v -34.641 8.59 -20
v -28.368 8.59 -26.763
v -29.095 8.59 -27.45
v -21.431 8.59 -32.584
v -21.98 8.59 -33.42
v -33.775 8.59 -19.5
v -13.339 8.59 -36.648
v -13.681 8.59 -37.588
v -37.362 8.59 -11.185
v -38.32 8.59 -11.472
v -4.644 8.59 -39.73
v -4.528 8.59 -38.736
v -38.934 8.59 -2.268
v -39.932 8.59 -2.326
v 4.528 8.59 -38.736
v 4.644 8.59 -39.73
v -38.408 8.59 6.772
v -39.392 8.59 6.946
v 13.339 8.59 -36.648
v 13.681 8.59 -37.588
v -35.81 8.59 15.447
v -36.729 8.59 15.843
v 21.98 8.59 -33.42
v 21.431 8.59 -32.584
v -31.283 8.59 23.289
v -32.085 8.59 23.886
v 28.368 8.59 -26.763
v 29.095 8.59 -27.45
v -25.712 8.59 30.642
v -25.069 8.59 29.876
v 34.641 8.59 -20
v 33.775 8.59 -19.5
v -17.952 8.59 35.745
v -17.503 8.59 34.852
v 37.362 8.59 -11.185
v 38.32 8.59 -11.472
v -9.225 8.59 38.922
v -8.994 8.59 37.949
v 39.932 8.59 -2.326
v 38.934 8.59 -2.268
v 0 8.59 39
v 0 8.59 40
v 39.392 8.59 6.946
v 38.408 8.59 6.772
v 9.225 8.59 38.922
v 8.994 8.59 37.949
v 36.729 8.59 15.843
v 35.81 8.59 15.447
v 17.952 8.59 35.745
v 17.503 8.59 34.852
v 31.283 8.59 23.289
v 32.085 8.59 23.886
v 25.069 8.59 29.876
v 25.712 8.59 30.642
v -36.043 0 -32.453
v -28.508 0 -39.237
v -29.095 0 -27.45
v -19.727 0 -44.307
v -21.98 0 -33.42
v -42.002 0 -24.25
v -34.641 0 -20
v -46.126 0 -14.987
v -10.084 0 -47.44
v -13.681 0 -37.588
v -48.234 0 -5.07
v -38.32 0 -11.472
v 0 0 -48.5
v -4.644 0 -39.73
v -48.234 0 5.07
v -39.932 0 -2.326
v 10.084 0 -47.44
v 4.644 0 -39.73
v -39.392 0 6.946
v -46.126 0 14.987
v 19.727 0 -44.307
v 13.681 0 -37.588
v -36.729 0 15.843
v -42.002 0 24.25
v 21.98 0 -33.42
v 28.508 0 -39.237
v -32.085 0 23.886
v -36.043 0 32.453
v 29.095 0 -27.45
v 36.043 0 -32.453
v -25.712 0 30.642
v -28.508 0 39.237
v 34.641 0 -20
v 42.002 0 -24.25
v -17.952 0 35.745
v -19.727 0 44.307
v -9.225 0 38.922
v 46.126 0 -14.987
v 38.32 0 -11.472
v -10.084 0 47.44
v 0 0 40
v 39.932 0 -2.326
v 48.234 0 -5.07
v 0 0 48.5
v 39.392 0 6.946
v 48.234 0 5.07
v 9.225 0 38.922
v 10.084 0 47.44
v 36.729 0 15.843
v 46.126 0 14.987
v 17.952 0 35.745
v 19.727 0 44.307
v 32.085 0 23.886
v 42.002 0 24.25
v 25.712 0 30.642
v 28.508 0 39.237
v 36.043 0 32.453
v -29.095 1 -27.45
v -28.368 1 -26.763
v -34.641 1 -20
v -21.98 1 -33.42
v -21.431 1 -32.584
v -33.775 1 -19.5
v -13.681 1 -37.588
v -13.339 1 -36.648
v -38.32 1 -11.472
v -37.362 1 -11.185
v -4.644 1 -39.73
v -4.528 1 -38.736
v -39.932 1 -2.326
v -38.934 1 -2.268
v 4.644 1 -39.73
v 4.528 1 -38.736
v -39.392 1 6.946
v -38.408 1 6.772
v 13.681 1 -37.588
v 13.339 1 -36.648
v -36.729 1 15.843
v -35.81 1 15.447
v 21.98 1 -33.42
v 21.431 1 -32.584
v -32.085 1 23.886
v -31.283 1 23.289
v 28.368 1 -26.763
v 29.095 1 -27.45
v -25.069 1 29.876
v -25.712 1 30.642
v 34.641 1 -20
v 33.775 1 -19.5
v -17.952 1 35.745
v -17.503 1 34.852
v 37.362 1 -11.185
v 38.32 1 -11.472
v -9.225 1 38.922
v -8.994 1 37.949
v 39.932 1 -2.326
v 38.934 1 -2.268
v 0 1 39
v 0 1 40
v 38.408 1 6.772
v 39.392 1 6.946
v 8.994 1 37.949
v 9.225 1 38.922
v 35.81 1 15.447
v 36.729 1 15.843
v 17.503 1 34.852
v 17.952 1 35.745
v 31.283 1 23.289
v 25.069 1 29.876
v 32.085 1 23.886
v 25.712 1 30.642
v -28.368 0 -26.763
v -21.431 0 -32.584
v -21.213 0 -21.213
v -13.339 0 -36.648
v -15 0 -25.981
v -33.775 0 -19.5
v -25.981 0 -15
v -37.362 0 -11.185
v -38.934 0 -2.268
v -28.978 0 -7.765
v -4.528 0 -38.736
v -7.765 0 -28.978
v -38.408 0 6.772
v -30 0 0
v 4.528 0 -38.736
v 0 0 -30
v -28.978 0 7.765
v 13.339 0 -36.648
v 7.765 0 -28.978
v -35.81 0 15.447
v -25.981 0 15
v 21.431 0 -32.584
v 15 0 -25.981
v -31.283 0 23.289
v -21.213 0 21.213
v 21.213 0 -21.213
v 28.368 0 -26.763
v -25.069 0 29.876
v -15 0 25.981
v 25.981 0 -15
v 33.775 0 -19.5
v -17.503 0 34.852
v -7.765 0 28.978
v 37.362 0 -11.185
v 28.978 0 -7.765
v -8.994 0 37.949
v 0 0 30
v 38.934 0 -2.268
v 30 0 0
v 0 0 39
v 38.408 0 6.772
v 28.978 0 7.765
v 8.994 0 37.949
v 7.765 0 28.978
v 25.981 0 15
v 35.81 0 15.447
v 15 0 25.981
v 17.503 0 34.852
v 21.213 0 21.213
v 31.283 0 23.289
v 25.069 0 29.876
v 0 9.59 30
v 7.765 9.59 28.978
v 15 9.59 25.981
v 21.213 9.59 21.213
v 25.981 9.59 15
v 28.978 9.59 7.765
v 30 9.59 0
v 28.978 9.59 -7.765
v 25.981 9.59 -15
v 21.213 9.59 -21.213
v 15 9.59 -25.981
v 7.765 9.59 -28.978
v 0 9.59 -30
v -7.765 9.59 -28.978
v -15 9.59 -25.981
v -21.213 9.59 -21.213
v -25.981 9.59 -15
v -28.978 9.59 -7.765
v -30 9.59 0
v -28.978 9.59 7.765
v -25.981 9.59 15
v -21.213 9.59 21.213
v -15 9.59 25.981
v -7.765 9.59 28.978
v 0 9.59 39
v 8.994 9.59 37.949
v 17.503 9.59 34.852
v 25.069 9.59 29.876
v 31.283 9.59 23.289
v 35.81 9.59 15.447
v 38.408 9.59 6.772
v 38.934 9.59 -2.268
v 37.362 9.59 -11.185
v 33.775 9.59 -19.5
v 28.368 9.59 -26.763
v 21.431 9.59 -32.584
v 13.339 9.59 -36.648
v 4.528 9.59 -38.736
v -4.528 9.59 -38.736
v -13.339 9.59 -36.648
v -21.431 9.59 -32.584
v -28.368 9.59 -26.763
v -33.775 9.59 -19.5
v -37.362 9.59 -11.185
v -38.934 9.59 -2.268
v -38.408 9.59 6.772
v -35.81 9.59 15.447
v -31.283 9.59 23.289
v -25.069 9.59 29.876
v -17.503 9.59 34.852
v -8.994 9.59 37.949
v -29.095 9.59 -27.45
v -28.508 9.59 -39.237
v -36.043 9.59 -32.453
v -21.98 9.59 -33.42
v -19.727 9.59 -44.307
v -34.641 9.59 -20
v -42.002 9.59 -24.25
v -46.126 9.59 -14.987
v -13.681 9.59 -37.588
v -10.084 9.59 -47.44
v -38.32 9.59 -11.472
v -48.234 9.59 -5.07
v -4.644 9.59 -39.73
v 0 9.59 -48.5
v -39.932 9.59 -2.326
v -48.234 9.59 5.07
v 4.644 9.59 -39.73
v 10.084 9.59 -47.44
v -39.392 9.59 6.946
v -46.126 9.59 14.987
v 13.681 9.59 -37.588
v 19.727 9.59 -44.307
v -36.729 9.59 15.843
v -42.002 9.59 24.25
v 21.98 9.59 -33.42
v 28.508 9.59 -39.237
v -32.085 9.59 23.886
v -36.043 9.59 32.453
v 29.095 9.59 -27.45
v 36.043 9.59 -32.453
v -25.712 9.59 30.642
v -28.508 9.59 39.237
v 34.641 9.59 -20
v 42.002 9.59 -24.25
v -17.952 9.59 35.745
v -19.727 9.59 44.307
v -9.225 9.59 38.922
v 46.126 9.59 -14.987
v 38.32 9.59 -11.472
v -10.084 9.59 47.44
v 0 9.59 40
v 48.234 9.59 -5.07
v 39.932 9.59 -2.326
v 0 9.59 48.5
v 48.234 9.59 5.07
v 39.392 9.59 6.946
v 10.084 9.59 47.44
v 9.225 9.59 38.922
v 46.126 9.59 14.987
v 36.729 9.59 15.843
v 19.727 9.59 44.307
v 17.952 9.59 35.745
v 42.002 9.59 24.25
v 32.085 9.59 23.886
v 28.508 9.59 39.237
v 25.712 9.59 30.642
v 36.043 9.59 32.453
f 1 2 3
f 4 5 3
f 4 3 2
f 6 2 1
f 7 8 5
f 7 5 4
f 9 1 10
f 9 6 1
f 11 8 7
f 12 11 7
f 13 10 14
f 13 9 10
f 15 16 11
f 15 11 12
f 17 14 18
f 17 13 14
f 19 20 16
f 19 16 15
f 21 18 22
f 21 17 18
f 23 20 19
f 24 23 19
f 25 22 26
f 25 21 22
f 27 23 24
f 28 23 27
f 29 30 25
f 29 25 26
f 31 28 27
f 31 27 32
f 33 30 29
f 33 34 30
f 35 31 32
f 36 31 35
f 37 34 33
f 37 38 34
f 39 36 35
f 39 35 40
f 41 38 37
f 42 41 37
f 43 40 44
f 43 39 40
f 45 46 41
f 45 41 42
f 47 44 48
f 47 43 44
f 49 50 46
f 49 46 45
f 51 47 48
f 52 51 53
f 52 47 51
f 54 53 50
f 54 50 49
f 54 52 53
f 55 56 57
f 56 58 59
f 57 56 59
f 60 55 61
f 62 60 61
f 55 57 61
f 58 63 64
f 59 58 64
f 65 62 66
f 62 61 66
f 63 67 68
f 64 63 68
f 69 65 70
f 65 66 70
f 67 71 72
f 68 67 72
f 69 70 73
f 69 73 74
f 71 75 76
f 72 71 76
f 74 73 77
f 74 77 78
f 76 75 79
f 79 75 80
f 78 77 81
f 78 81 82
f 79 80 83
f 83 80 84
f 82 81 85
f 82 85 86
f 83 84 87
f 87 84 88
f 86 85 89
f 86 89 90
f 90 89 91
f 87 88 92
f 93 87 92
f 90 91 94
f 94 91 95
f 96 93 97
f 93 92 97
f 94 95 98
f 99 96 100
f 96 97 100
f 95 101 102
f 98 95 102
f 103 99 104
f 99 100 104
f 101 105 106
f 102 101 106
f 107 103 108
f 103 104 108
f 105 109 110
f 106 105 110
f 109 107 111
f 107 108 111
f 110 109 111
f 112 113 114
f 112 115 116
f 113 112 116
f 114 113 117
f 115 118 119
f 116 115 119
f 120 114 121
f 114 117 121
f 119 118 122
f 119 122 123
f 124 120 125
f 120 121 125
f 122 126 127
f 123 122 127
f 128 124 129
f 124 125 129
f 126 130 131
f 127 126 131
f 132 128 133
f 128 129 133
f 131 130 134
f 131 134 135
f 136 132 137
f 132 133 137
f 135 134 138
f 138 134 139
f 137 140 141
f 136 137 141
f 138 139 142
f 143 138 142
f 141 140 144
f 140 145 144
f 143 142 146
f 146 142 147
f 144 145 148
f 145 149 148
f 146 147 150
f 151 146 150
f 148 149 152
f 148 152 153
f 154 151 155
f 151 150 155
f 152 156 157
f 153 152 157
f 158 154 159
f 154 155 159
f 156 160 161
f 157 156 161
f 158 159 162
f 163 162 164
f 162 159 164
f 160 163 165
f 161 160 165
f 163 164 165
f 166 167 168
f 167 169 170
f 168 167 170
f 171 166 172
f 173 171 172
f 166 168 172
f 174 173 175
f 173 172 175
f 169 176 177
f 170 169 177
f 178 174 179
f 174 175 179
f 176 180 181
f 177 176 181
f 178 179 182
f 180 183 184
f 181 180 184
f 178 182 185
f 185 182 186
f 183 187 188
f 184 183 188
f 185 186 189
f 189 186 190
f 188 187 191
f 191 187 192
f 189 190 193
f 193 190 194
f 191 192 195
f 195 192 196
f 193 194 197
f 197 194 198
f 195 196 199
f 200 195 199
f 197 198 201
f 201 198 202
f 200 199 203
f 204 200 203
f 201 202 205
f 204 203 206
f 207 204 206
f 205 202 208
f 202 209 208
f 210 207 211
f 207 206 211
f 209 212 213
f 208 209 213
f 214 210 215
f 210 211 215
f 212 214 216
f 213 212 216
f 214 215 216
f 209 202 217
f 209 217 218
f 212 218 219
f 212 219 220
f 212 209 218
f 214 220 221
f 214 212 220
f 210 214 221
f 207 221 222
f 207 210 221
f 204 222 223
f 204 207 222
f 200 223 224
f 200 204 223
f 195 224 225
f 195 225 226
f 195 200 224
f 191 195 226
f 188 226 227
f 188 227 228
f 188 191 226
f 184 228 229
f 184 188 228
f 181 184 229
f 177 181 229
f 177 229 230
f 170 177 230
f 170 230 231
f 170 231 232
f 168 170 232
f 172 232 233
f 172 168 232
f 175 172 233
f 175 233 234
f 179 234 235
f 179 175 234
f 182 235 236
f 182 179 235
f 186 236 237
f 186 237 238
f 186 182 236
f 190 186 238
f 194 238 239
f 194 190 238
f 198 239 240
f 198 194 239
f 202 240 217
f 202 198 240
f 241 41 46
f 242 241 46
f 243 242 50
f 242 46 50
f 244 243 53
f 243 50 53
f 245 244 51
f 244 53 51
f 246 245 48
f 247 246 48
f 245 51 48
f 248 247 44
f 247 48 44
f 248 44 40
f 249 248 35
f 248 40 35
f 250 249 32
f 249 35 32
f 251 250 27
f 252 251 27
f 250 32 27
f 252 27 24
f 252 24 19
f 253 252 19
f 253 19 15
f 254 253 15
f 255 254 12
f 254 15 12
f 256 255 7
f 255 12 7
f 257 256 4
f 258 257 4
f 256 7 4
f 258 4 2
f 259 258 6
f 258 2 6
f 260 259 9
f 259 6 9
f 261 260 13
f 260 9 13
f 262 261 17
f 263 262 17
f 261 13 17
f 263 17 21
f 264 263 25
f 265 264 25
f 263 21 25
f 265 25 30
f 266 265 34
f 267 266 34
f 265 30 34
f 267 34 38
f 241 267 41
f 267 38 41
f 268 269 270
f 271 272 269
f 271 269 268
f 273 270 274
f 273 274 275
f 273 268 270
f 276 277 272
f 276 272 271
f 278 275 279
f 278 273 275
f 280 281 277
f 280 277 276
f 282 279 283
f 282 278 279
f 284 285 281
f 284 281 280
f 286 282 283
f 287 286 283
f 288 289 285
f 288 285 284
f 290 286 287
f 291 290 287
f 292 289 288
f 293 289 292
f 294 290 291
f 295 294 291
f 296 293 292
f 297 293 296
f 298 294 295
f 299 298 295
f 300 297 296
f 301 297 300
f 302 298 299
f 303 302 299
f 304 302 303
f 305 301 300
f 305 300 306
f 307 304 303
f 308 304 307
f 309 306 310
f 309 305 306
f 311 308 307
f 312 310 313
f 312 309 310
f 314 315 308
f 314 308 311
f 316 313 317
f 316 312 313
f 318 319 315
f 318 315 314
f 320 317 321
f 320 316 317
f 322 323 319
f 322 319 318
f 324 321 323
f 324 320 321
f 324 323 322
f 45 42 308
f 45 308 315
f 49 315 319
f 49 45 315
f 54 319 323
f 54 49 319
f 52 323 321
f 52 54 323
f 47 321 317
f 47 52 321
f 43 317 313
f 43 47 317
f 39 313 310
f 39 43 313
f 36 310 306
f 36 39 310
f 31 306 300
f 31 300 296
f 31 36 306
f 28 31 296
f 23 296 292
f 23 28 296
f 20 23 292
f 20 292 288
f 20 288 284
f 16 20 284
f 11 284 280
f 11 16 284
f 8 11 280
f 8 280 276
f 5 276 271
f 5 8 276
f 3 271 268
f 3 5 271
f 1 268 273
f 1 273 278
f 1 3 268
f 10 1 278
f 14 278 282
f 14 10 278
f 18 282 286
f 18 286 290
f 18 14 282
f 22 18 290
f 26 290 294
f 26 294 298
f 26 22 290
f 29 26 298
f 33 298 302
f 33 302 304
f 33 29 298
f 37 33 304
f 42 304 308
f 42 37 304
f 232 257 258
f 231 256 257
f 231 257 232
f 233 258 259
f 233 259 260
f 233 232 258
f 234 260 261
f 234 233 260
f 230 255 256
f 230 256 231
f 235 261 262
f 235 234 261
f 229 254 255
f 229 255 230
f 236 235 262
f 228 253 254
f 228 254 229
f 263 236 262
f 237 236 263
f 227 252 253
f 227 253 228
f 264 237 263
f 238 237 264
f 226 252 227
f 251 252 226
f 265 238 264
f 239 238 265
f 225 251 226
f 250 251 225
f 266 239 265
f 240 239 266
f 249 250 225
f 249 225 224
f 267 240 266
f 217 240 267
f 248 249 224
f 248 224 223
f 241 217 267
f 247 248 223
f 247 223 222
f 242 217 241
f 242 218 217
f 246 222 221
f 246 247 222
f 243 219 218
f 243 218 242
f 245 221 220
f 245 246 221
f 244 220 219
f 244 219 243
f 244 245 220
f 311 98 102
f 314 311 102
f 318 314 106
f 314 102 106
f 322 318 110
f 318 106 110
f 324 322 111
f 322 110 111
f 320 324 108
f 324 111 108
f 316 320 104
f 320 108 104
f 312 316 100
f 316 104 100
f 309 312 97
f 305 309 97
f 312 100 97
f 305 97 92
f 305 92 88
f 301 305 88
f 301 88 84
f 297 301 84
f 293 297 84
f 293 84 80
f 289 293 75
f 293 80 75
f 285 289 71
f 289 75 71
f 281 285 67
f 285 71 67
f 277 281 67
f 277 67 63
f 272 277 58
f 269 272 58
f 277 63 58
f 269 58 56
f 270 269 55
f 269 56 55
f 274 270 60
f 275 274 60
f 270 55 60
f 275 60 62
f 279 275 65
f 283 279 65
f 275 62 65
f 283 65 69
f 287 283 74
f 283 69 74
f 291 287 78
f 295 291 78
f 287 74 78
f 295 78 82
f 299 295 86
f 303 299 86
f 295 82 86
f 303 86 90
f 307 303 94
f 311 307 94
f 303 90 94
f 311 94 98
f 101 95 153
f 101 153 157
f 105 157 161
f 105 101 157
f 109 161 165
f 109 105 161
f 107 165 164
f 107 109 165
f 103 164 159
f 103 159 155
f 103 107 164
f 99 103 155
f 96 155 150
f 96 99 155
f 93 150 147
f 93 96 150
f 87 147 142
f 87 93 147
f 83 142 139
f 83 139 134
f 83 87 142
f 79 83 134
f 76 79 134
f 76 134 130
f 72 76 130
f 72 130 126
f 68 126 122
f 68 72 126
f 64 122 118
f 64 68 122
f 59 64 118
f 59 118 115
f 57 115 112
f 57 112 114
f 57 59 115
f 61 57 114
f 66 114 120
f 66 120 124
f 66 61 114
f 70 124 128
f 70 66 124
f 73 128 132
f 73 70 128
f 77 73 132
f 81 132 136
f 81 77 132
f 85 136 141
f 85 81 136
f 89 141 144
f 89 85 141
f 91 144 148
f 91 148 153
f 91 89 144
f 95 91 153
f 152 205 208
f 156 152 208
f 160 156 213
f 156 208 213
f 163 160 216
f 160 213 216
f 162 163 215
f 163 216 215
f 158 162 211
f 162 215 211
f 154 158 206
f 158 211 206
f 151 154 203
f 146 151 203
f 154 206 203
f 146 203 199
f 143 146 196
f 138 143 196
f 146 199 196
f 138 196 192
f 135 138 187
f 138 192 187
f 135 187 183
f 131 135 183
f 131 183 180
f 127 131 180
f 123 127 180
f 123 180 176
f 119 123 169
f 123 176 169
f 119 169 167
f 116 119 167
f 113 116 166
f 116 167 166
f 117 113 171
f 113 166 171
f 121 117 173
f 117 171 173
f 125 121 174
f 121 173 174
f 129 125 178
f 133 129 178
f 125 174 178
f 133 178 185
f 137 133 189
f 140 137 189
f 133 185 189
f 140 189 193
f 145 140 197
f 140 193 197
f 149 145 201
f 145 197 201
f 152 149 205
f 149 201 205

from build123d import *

# Parameters (mm, degrees)
SKETCH1_R           = 48.5
SKETCH1_R_2         = 30
BOSS_EXTRUDE1_DEPTH = 9.59
SKETCH2_R           = 40
SKETCH2_R_2         = 39
CUT_EXTRUDE1_DEPTH  = 1
CUT_EXTRUDE2_START  = -1
SKETCH3_R           = 40
SKETCH3_R_2         = 39
CUT_EXTRUDE2_DEPTH  = 1


with BuildPart() as part:
    # Sketch1 → Boss-Extrude1 (new body)
    with BuildSketch(Plane(origin=(0, 0, 0), x_dir=(1, 0, 0), z_dir=(0, 1, 0))):
        with Locations(Location((0, 0, 0), (0, 0, 270))):
            Circle(SKETCH1_R)
        with Locations(Location((0, 0, 0), (0, 0, 270))):
            Circle(SKETCH1_R_2, mode=Mode.SUBTRACT)
    extrude(amount=BOSS_EXTRUDE1_DEPTH)

    # Sketch2 → Cut-Extrude1 (cut)
    with BuildSketch(Plane(origin=(0, 0, 0), x_dir=(1, 0, 0), z_dir=(0, 1, 0))):
        with Locations(Location((0, 0, 0), (0, 0, 270))):
            Circle(SKETCH2_R)
        with Locations(Location((0, 0, 0), (0, 0, 270))):
            Circle(SKETCH2_R_2, mode=Mode.SUBTRACT)
    extrude(amount=CUT_EXTRUDE1_DEPTH, mode=Mode.SUBTRACT)

    # Sketch3 → Cut-Extrude2 (cut)
    with BuildSketch(Plane(origin=(0, 9.59, 0), x_dir=(1, 0, 0), z_dir=(0, 1, 0)).offset(CUT_EXTRUDE2_START)):
        with Locations(Location((0, 0, 0), (0, 0, 270))):
            Circle(SKETCH3_R)
        with Locations(Location((0, 0, 0), (0, 0, 270))):
            Circle(SKETCH3_R_2, mode=Mode.SUBTRACT)
    extrude(amount=CUT_EXTRUDE2_DEPTH, mode=Mode.SUBTRACT)


solid = part.part
